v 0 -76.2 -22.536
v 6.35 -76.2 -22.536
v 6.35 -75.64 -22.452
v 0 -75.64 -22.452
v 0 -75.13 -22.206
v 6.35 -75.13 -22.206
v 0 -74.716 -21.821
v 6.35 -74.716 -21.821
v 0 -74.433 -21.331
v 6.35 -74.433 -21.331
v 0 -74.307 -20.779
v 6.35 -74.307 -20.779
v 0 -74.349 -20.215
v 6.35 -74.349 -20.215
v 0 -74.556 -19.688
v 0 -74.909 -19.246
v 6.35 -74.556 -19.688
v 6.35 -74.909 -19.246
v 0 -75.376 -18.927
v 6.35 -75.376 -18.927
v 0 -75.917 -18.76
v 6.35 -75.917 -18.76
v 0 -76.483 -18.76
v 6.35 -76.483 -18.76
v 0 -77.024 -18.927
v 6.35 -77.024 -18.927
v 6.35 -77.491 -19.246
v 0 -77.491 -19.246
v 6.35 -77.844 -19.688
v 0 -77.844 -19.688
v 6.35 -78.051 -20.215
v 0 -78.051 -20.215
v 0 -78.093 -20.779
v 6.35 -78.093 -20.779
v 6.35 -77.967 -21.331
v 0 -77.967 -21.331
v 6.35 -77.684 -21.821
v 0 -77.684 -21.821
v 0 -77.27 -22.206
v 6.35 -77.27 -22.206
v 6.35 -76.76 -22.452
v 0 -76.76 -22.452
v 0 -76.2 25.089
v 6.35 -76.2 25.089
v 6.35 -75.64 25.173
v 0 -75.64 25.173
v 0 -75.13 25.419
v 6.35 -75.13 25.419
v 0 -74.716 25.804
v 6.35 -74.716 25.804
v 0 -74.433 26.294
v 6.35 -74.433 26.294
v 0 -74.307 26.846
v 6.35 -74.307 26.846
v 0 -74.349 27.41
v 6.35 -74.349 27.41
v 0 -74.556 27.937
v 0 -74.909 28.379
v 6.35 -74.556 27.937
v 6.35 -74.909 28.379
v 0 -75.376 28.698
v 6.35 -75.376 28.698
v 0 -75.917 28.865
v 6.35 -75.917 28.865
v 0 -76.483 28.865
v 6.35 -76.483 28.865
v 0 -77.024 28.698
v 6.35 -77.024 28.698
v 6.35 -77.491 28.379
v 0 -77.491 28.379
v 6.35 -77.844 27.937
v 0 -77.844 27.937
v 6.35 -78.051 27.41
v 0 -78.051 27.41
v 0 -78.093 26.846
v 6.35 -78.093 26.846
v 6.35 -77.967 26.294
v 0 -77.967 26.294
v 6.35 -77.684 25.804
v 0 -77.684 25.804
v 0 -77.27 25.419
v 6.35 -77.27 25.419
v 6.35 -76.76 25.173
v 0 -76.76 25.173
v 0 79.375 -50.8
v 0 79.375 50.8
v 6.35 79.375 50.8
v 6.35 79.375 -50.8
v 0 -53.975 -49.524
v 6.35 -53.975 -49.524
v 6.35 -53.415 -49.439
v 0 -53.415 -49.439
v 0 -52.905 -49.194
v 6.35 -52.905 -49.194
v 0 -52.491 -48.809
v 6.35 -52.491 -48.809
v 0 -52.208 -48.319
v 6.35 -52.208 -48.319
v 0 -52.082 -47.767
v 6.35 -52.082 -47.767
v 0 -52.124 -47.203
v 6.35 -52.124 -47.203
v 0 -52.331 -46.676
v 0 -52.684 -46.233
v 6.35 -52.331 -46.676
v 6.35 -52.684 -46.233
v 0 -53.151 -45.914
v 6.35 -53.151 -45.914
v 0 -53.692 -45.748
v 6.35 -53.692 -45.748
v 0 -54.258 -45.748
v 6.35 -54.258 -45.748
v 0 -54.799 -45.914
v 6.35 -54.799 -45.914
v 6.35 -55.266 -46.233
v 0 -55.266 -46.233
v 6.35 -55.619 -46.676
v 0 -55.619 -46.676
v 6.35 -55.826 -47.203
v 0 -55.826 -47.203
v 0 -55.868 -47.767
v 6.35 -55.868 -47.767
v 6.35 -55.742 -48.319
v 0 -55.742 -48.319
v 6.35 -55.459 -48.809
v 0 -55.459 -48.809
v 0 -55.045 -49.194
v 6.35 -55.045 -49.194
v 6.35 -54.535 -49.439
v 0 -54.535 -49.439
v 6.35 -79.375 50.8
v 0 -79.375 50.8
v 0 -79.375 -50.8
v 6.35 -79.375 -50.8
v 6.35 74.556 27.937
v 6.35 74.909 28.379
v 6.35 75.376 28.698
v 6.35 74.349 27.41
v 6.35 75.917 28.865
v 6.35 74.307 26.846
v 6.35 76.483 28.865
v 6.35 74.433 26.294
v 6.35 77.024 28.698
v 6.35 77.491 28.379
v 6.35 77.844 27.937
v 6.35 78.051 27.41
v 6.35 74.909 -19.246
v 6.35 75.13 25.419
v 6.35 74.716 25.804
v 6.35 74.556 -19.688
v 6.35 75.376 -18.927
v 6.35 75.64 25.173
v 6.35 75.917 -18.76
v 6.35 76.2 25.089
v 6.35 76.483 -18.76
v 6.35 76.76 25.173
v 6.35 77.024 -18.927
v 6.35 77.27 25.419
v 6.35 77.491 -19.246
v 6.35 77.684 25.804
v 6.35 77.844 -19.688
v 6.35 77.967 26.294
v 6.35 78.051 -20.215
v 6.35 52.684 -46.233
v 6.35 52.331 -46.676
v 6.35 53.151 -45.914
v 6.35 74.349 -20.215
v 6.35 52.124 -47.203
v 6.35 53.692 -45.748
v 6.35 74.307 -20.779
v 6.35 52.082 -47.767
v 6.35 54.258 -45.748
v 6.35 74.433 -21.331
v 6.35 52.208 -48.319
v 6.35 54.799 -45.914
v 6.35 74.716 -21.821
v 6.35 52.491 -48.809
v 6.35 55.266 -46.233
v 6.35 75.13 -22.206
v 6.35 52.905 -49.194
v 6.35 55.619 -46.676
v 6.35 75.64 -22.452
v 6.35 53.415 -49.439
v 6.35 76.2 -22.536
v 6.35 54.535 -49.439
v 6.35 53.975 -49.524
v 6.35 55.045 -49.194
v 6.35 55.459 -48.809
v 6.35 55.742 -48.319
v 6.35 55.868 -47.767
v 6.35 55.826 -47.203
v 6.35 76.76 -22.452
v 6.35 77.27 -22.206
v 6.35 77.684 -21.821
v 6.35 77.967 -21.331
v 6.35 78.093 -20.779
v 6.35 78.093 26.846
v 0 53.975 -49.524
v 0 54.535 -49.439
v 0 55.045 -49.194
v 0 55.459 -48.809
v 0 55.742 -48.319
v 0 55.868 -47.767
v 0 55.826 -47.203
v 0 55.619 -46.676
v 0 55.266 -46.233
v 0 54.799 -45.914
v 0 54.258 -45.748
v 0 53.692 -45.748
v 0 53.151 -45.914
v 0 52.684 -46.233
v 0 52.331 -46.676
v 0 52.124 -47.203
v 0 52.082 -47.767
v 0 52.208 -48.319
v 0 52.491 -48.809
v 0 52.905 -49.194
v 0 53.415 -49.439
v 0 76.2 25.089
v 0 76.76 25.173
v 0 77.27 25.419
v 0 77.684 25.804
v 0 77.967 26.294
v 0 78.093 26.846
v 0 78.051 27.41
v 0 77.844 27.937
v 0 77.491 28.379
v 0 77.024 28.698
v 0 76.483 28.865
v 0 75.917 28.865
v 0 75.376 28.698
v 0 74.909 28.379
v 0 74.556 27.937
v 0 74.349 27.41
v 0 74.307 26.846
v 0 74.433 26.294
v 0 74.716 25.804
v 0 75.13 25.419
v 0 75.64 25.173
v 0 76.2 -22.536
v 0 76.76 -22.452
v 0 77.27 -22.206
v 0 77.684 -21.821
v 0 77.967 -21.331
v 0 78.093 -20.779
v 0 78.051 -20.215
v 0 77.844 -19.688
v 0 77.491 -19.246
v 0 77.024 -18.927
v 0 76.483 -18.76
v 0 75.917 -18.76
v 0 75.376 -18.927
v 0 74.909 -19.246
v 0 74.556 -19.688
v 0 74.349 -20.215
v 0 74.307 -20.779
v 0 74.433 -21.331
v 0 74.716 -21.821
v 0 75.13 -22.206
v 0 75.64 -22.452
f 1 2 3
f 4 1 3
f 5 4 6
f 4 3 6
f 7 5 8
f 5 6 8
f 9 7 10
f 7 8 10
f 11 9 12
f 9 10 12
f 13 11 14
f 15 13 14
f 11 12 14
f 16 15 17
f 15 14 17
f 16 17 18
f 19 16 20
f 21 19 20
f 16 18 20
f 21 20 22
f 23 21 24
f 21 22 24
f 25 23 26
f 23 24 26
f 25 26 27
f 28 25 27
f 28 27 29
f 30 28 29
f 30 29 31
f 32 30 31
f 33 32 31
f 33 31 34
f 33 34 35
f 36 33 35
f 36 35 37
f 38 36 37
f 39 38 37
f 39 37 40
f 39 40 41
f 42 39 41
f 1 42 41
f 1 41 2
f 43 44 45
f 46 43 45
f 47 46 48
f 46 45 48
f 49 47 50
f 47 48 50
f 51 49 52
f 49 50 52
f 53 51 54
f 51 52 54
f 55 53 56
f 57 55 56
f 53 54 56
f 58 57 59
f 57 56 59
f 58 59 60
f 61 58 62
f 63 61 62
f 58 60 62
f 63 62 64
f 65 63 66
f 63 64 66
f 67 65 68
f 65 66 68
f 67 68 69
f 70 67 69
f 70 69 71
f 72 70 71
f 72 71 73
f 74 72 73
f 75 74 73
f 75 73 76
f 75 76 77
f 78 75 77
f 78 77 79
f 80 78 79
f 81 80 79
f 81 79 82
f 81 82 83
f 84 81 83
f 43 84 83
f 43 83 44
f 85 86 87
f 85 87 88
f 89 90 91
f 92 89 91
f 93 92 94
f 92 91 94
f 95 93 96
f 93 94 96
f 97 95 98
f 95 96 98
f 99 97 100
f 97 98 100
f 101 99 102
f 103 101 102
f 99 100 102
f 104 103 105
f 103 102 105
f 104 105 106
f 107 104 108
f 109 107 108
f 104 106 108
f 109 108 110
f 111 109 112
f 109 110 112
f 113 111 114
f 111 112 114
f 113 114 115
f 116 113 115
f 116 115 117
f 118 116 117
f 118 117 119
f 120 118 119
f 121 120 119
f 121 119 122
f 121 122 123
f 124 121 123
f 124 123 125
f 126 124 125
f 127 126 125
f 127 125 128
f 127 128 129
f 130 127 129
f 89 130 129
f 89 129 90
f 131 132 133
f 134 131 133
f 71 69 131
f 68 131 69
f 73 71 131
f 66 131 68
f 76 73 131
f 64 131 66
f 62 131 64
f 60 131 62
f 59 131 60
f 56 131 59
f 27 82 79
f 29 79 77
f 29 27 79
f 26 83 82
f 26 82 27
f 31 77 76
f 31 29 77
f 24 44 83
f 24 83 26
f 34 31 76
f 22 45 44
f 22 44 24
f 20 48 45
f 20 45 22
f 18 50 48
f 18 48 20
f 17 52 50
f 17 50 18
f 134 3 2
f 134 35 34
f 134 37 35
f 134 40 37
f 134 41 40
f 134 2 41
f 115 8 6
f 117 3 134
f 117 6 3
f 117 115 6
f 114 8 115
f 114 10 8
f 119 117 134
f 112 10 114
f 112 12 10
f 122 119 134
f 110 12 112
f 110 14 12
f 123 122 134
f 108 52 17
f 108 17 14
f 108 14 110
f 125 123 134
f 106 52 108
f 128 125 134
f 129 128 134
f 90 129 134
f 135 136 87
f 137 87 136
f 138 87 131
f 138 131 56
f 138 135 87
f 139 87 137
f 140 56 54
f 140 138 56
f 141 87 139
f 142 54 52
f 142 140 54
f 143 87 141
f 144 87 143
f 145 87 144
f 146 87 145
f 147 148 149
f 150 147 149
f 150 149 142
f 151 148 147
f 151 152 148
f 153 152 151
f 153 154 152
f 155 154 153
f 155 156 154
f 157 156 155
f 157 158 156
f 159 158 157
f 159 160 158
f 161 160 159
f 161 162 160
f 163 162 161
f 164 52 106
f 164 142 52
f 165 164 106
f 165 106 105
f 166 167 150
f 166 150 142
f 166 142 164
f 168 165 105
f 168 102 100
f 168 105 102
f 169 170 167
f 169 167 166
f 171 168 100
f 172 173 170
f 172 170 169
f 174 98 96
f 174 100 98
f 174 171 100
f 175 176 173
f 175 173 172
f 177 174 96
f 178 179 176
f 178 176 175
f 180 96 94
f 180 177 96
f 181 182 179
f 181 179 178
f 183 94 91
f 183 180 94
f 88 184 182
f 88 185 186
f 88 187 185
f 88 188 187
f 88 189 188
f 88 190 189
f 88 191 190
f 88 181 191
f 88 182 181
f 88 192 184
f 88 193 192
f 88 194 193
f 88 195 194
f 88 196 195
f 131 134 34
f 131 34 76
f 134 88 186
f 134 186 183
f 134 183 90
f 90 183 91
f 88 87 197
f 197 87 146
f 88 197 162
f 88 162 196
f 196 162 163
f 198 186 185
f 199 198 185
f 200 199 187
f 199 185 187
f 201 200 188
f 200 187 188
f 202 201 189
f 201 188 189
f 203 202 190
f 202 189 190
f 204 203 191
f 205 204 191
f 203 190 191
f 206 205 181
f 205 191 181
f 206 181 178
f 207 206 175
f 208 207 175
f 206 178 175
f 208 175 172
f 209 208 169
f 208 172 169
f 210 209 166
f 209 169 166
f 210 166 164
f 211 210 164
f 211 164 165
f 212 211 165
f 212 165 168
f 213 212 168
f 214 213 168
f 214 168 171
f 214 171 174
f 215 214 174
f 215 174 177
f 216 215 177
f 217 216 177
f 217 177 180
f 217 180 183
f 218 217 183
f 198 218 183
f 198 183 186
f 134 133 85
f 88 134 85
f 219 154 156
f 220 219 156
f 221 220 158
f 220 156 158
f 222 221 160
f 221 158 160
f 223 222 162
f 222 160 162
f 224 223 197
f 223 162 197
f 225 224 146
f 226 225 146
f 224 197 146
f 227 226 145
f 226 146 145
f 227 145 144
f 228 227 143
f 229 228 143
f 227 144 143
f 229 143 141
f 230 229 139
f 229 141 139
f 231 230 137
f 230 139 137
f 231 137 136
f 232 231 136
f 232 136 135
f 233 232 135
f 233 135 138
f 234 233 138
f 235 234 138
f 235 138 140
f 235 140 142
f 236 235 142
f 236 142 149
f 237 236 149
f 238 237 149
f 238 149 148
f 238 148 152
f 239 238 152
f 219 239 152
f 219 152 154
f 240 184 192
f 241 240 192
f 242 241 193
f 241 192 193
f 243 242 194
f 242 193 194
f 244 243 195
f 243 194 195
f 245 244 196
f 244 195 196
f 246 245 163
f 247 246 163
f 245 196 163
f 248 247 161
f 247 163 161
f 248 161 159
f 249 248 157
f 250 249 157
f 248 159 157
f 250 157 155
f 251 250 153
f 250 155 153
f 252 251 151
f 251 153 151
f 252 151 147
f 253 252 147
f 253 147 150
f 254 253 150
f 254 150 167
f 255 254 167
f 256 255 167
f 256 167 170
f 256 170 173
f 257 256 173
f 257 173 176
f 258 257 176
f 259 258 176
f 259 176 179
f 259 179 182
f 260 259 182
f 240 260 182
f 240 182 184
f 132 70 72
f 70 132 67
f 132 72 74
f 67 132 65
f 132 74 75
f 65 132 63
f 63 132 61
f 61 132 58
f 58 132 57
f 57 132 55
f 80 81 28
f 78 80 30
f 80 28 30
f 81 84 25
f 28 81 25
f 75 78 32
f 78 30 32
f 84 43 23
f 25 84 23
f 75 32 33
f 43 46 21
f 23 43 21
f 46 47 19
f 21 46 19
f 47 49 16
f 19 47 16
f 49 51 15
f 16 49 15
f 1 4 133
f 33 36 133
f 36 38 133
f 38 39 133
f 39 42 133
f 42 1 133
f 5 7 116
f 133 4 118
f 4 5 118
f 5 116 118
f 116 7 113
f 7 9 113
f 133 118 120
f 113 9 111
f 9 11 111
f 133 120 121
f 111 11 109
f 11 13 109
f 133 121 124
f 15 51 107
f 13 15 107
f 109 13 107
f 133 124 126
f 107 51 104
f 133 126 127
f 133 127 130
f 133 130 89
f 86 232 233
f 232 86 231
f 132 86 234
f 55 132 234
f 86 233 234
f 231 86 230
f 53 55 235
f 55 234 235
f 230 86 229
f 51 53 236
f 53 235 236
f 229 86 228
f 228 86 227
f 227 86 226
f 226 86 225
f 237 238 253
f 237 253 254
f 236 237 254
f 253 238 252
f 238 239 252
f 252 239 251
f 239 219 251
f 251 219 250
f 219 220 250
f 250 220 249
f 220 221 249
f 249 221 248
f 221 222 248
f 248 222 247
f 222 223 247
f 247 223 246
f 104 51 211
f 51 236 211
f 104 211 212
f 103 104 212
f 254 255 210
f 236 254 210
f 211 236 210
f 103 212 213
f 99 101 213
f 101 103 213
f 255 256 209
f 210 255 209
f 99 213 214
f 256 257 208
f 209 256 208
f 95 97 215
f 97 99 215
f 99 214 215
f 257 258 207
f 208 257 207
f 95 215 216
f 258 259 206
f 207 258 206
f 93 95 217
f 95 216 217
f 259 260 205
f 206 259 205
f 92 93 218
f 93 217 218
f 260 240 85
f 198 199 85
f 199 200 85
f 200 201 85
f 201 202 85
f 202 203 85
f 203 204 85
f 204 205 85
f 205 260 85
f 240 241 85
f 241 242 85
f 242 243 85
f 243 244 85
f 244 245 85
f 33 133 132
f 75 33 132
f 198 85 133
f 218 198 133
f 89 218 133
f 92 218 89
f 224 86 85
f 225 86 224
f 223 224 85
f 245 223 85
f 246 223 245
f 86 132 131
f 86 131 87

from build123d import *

# Parameters (mm, degrees)
SKETCH1_W             = 101.6
SKETCH1_H             = 158.75
BOSS_EXTRUDE1_DEPTH   = 6.35
F_6_CLEARANCE_HOLE1_D = 3.7973


with BuildPart() as part:
    # Sketch1 → Boss-Extrude1 (new body)
    with BuildSketch(Plane(origin=(0, 0, 0), x_dir=(0, 0, -1), z_dir=(1, 0, 0))):
        Rectangle(SKETCH1_W, SKETCH1_H)
    extrude(amount=BOSS_EXTRUDE1_DEPTH)

    # #6 Clearance Hole1 (through all)
    with Locations(Plane.ZY):
        with Locations((-47.625, 53.975), (-20.6375, 76.2), (26.9875, 76.2), (26.9875, -76.2), (-20.6375, -76.2), (-47.625, -53.975)):
            Hole(F_6_CLEARANCE_HOLE1_D / 2)


solid = part.part
